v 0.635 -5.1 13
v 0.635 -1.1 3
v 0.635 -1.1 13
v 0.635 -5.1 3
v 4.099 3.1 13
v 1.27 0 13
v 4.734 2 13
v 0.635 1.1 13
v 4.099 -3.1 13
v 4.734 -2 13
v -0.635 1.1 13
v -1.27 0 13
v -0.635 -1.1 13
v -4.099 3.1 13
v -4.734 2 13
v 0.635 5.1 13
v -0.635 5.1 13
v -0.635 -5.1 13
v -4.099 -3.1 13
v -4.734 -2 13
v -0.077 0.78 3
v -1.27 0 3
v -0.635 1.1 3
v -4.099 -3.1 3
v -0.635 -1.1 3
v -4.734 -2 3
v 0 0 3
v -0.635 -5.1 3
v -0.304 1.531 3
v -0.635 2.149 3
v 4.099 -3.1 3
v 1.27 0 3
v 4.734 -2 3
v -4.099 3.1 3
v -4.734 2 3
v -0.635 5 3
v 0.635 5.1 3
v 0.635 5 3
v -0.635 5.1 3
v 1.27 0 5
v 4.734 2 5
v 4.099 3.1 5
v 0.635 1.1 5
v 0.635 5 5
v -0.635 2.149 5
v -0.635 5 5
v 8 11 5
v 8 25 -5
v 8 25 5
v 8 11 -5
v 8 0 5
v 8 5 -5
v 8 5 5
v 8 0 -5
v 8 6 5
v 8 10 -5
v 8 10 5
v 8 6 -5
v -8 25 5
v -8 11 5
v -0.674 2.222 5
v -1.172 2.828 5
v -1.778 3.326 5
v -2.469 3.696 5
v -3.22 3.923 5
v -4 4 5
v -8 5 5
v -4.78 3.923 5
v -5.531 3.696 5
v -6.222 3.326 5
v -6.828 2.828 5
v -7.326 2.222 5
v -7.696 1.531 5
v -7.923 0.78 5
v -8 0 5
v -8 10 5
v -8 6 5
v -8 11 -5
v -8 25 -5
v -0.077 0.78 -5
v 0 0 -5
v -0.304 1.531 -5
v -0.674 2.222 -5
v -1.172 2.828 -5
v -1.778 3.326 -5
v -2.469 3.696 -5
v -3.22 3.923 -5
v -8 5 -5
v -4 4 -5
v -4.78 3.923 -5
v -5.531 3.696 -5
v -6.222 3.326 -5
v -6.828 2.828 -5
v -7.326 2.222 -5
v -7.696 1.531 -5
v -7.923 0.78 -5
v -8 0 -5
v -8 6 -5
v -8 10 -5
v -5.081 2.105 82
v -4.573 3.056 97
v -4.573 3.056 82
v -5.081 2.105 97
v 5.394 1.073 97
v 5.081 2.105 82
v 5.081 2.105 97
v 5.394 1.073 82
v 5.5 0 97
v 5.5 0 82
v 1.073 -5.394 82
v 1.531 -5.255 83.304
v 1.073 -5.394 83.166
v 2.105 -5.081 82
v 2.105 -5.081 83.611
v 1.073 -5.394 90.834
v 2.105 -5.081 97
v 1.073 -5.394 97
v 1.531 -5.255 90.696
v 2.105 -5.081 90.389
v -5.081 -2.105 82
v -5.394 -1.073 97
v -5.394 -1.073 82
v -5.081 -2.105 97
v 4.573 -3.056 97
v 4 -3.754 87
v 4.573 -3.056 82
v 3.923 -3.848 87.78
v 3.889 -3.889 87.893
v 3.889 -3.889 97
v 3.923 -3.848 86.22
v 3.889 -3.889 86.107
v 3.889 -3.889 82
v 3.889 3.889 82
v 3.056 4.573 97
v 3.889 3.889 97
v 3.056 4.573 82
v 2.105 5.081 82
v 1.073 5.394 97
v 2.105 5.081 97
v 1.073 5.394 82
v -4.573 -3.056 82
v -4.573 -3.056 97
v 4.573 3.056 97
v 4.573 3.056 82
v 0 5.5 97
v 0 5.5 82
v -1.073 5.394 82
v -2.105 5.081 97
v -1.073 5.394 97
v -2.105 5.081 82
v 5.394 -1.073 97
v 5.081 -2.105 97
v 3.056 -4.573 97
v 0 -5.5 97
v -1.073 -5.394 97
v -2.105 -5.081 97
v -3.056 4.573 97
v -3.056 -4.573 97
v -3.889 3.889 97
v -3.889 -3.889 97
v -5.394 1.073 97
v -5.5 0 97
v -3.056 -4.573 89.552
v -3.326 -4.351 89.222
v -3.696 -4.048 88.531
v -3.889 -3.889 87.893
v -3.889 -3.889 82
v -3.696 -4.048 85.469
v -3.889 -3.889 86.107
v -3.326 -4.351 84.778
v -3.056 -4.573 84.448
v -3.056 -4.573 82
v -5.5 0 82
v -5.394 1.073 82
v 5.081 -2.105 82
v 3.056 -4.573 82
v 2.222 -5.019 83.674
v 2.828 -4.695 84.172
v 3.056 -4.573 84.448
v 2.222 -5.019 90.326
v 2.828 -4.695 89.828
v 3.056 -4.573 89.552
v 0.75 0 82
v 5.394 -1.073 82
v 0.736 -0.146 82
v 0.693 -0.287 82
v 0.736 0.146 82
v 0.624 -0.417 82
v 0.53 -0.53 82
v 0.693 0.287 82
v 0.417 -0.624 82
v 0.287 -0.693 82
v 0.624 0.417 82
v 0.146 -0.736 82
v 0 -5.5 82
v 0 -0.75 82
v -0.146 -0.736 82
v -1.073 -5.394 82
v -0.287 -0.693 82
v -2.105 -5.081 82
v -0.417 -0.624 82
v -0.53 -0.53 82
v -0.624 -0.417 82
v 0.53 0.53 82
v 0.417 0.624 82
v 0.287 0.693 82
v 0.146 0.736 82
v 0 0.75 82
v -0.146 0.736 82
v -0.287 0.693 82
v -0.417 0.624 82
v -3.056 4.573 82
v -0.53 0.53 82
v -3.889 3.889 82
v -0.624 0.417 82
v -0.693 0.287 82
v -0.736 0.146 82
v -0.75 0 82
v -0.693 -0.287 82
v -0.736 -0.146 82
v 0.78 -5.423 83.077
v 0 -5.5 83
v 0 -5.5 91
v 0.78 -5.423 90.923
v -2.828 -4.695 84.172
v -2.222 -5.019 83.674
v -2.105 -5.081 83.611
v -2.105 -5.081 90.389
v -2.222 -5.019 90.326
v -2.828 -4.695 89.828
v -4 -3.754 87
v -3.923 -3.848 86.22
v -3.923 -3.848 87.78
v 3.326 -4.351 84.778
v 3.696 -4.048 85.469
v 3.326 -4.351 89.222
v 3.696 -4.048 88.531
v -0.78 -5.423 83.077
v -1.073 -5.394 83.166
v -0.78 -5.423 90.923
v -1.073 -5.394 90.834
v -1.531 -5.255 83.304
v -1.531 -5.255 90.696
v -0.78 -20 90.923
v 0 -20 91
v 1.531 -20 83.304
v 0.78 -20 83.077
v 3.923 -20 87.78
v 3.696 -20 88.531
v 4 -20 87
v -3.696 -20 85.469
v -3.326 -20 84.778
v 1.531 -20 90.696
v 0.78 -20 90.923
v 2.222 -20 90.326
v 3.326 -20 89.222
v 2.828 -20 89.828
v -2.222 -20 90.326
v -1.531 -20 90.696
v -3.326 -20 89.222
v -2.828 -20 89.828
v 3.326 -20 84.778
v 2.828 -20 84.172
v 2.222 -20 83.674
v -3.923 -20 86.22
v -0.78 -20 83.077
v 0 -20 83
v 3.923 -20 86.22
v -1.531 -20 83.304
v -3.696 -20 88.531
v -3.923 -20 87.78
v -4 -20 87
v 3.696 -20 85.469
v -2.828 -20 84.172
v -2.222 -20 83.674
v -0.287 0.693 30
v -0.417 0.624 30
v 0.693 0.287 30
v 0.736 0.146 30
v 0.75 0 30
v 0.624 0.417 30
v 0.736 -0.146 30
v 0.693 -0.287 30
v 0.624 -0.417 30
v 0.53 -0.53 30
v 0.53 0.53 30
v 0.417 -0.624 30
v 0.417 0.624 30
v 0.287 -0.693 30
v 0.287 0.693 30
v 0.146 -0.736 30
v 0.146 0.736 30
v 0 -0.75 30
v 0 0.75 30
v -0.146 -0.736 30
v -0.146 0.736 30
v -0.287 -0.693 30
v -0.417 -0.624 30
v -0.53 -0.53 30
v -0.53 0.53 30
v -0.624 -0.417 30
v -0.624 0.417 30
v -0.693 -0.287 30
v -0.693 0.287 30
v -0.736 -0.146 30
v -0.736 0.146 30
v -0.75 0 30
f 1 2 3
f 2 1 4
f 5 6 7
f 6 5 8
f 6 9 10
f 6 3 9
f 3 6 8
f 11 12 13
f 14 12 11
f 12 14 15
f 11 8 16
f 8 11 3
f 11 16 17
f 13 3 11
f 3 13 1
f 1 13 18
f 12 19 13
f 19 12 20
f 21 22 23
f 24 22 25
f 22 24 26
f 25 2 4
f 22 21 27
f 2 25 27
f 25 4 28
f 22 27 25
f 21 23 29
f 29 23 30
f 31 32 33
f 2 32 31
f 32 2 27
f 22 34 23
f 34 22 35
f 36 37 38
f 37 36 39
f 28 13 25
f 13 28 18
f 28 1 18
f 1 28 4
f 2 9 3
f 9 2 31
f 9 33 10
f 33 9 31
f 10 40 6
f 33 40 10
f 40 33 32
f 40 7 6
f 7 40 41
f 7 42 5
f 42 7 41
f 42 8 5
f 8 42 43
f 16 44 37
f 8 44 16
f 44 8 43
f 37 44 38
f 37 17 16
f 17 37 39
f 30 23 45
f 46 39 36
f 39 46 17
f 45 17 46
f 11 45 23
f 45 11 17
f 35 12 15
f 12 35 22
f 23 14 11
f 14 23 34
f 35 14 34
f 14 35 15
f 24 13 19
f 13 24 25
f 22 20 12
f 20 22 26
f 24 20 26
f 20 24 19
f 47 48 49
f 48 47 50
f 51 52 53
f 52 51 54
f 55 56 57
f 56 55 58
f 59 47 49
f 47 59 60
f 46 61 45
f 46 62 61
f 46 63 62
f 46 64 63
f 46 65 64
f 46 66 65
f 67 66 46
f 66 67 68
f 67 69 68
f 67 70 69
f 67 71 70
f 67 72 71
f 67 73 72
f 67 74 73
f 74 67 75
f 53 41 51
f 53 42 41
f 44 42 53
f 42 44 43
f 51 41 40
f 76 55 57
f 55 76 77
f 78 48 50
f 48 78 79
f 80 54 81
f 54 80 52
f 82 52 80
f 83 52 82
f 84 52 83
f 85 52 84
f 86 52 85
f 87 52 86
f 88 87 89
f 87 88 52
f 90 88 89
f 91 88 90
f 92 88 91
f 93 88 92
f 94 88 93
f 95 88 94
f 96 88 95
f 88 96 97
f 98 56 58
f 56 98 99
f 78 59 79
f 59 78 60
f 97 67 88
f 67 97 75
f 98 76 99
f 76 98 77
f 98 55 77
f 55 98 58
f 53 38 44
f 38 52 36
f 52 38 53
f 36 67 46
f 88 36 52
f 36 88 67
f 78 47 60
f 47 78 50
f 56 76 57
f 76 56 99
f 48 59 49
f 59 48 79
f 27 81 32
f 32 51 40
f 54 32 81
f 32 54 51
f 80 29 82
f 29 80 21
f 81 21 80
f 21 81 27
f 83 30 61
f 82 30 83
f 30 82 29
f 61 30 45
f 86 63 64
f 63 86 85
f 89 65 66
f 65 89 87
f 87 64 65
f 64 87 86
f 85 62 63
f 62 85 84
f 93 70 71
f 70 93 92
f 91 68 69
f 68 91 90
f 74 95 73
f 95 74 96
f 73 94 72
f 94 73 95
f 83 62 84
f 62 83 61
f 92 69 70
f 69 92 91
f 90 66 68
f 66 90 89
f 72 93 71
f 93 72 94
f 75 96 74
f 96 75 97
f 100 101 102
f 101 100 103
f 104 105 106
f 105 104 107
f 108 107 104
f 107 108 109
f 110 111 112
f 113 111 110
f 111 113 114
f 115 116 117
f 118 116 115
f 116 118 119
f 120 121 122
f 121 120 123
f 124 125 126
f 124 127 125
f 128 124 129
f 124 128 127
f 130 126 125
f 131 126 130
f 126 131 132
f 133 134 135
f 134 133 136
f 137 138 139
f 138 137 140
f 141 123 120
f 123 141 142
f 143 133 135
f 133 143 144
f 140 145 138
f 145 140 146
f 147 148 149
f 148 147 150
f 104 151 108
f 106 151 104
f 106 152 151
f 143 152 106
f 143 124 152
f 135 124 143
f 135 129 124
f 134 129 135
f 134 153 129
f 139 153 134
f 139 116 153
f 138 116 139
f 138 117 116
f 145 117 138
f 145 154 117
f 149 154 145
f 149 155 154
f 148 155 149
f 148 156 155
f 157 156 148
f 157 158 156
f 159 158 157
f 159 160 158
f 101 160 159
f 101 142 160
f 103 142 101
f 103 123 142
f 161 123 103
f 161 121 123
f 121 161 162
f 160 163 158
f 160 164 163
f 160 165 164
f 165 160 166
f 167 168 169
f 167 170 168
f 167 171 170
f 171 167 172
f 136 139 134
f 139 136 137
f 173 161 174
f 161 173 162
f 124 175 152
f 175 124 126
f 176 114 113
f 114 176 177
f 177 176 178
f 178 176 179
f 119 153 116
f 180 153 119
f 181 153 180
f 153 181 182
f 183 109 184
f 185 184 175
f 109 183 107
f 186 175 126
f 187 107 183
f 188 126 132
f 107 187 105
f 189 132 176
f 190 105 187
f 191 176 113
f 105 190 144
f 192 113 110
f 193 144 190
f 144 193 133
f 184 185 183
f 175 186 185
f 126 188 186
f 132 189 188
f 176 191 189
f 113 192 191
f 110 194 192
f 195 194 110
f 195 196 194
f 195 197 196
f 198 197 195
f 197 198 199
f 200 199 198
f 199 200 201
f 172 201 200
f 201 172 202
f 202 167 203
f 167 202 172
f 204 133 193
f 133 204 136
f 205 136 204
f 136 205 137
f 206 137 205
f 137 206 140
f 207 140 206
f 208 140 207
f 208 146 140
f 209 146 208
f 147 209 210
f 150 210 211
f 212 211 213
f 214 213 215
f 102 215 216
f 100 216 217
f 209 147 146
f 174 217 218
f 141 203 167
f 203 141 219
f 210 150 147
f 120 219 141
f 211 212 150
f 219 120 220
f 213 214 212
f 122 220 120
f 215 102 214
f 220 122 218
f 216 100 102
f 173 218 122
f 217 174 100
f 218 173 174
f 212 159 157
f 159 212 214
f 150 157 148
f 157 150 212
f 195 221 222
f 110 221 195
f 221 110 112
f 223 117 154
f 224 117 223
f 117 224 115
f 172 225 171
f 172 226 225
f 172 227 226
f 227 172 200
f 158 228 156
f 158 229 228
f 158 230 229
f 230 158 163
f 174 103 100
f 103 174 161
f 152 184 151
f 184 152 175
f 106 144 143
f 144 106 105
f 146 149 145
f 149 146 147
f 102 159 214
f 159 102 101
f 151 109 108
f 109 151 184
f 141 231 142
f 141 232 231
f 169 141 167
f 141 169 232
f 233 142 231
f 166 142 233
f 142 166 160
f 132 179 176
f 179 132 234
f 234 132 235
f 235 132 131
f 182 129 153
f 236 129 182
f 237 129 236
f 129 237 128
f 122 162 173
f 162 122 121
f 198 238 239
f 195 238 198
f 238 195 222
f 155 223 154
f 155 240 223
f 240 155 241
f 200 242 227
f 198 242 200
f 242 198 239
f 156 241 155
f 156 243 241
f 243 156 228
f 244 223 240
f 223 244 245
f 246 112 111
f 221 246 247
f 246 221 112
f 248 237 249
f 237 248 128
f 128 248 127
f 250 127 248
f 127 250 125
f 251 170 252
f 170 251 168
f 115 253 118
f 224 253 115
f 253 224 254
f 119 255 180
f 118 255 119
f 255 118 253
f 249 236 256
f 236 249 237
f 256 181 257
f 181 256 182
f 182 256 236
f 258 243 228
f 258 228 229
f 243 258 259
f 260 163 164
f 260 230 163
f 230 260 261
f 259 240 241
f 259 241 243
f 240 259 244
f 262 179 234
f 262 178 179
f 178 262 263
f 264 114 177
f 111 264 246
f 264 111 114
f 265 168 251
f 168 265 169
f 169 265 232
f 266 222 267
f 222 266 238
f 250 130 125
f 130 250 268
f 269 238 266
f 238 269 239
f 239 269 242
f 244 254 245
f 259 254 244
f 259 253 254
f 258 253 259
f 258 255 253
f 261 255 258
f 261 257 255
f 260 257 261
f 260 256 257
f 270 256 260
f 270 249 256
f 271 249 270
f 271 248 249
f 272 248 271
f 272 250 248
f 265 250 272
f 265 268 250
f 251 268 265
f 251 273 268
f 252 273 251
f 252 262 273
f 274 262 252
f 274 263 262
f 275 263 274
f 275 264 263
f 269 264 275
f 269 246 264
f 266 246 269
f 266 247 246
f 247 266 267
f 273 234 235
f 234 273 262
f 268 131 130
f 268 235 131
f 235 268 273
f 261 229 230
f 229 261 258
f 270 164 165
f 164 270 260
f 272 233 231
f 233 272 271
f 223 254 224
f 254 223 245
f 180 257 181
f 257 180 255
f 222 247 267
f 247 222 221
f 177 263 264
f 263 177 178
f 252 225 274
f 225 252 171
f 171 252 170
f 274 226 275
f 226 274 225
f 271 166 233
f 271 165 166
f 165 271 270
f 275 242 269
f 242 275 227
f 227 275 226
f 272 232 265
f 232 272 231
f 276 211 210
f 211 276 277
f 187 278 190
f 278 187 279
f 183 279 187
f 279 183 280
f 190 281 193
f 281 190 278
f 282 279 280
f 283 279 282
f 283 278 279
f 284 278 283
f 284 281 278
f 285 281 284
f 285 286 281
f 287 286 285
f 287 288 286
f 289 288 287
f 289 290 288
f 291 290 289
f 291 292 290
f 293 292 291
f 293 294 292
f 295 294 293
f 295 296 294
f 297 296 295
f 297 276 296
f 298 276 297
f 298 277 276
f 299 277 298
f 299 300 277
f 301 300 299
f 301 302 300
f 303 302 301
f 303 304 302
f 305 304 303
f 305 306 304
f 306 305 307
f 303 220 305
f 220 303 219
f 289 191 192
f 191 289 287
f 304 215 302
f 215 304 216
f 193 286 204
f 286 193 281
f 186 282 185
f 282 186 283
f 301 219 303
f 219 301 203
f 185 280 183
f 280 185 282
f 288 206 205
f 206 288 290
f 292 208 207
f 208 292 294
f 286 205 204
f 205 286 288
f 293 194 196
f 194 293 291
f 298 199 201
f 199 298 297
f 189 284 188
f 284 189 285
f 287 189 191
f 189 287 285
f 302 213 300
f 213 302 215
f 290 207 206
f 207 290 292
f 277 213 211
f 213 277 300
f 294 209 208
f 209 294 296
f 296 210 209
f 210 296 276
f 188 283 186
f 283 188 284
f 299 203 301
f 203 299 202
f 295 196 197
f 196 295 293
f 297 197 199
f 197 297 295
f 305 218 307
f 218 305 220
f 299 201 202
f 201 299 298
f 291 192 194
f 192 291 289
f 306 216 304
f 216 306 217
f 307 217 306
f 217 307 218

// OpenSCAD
// Generated by CadMonkey
// Prompt: hey cadmonkey, create me a cylinder
// Generated at: 2025-11-11 05:48:03

// Realistic Medium-Complexity Cylinder Tool (Tool Steel)
// Overall length ≈ 90 mm, printable without supports

$fn = 32; // smooth curves

module main_grip() {
    // 6-groove hexagonal grip pattern
    for(i=[0:5]) {
        rotate([0, 0, i*60])
            translate([0, -2.54, 8])
                cube([1.27, 5.12, 10], center=true);
    }
}

module tool_steel_core() {
    color("silver")
    difference() {
        union() {
            // central shaft
            cylinder(h=85, d=15);

            // six cylindrical grooves
            for(i=[0:5]) {
                rotate([0, 0, i*60 + 30])
                    translate([7.62, 0, 40])
                        cube([14.3, 2.54, 70], center=true);
            }

            // chamfered end
            translate([0, 0, 85])
                cylinder(h=5, d1=15, d2=11);
        }

        // lightening holes (subtle)
        for(i=[0:5]) {
            rotate([0, 0, i*60 + 30])
                translate([9.55, 0, 45])
                    sphere(d=4);
        }
    }
}

module heat_sink() {
    // small flat plate with cooling fins
    color("gray")
    difference() {
        // main heat sink block
        translate([-8, 0, -5])
            cube([16, 25, 10]);

        // cooling fins via subtractive operations
        for(y=[-1,-0.5,0.5,1]) {
            translate([-8, y*10, -5])
                cube([16, 1, 10]);
        }

        // central through hole
        translate([-4, 0, -5])
            cylinder(h=22, d=8);
    }
}

module allen_key_tip() {
    // short metal insert at tip
    color("gold")
    union() {
        // main shaft
        translate([0, 0, 82])
            cylinder(h=15, d=11);

        // allen key slot
        translate([0, 0, 87])
            rotate([90, 0, 0])
                cylinder(h=20, d=8);
    }
}

module end_cap() {
    // rounded copper cap
    color("copper")
    difference() {
        // main cap body
        translate([0, 0, 100])
            cylinder(h=8, d=18);

        // hollow underside
        translate([0, 0, 97])
            cylinder(h=6, d=13);

        // screw threads on bottom
        for(a=[0:120:240]) {
            rotate([0, 0, a])
                translate([7.38, 0, 98])
                    cube([1.53, 1.05, 1.53], center=true);
        }
    }
}

// Assembly
union() {
    main_grip();
    heat_sink();
    allen_key_tip();

    // lubrication groove
    color("darkblue", 0.4)
    translate([0, 0, 30])
        cylinder(h=60, d=1.50);
}
